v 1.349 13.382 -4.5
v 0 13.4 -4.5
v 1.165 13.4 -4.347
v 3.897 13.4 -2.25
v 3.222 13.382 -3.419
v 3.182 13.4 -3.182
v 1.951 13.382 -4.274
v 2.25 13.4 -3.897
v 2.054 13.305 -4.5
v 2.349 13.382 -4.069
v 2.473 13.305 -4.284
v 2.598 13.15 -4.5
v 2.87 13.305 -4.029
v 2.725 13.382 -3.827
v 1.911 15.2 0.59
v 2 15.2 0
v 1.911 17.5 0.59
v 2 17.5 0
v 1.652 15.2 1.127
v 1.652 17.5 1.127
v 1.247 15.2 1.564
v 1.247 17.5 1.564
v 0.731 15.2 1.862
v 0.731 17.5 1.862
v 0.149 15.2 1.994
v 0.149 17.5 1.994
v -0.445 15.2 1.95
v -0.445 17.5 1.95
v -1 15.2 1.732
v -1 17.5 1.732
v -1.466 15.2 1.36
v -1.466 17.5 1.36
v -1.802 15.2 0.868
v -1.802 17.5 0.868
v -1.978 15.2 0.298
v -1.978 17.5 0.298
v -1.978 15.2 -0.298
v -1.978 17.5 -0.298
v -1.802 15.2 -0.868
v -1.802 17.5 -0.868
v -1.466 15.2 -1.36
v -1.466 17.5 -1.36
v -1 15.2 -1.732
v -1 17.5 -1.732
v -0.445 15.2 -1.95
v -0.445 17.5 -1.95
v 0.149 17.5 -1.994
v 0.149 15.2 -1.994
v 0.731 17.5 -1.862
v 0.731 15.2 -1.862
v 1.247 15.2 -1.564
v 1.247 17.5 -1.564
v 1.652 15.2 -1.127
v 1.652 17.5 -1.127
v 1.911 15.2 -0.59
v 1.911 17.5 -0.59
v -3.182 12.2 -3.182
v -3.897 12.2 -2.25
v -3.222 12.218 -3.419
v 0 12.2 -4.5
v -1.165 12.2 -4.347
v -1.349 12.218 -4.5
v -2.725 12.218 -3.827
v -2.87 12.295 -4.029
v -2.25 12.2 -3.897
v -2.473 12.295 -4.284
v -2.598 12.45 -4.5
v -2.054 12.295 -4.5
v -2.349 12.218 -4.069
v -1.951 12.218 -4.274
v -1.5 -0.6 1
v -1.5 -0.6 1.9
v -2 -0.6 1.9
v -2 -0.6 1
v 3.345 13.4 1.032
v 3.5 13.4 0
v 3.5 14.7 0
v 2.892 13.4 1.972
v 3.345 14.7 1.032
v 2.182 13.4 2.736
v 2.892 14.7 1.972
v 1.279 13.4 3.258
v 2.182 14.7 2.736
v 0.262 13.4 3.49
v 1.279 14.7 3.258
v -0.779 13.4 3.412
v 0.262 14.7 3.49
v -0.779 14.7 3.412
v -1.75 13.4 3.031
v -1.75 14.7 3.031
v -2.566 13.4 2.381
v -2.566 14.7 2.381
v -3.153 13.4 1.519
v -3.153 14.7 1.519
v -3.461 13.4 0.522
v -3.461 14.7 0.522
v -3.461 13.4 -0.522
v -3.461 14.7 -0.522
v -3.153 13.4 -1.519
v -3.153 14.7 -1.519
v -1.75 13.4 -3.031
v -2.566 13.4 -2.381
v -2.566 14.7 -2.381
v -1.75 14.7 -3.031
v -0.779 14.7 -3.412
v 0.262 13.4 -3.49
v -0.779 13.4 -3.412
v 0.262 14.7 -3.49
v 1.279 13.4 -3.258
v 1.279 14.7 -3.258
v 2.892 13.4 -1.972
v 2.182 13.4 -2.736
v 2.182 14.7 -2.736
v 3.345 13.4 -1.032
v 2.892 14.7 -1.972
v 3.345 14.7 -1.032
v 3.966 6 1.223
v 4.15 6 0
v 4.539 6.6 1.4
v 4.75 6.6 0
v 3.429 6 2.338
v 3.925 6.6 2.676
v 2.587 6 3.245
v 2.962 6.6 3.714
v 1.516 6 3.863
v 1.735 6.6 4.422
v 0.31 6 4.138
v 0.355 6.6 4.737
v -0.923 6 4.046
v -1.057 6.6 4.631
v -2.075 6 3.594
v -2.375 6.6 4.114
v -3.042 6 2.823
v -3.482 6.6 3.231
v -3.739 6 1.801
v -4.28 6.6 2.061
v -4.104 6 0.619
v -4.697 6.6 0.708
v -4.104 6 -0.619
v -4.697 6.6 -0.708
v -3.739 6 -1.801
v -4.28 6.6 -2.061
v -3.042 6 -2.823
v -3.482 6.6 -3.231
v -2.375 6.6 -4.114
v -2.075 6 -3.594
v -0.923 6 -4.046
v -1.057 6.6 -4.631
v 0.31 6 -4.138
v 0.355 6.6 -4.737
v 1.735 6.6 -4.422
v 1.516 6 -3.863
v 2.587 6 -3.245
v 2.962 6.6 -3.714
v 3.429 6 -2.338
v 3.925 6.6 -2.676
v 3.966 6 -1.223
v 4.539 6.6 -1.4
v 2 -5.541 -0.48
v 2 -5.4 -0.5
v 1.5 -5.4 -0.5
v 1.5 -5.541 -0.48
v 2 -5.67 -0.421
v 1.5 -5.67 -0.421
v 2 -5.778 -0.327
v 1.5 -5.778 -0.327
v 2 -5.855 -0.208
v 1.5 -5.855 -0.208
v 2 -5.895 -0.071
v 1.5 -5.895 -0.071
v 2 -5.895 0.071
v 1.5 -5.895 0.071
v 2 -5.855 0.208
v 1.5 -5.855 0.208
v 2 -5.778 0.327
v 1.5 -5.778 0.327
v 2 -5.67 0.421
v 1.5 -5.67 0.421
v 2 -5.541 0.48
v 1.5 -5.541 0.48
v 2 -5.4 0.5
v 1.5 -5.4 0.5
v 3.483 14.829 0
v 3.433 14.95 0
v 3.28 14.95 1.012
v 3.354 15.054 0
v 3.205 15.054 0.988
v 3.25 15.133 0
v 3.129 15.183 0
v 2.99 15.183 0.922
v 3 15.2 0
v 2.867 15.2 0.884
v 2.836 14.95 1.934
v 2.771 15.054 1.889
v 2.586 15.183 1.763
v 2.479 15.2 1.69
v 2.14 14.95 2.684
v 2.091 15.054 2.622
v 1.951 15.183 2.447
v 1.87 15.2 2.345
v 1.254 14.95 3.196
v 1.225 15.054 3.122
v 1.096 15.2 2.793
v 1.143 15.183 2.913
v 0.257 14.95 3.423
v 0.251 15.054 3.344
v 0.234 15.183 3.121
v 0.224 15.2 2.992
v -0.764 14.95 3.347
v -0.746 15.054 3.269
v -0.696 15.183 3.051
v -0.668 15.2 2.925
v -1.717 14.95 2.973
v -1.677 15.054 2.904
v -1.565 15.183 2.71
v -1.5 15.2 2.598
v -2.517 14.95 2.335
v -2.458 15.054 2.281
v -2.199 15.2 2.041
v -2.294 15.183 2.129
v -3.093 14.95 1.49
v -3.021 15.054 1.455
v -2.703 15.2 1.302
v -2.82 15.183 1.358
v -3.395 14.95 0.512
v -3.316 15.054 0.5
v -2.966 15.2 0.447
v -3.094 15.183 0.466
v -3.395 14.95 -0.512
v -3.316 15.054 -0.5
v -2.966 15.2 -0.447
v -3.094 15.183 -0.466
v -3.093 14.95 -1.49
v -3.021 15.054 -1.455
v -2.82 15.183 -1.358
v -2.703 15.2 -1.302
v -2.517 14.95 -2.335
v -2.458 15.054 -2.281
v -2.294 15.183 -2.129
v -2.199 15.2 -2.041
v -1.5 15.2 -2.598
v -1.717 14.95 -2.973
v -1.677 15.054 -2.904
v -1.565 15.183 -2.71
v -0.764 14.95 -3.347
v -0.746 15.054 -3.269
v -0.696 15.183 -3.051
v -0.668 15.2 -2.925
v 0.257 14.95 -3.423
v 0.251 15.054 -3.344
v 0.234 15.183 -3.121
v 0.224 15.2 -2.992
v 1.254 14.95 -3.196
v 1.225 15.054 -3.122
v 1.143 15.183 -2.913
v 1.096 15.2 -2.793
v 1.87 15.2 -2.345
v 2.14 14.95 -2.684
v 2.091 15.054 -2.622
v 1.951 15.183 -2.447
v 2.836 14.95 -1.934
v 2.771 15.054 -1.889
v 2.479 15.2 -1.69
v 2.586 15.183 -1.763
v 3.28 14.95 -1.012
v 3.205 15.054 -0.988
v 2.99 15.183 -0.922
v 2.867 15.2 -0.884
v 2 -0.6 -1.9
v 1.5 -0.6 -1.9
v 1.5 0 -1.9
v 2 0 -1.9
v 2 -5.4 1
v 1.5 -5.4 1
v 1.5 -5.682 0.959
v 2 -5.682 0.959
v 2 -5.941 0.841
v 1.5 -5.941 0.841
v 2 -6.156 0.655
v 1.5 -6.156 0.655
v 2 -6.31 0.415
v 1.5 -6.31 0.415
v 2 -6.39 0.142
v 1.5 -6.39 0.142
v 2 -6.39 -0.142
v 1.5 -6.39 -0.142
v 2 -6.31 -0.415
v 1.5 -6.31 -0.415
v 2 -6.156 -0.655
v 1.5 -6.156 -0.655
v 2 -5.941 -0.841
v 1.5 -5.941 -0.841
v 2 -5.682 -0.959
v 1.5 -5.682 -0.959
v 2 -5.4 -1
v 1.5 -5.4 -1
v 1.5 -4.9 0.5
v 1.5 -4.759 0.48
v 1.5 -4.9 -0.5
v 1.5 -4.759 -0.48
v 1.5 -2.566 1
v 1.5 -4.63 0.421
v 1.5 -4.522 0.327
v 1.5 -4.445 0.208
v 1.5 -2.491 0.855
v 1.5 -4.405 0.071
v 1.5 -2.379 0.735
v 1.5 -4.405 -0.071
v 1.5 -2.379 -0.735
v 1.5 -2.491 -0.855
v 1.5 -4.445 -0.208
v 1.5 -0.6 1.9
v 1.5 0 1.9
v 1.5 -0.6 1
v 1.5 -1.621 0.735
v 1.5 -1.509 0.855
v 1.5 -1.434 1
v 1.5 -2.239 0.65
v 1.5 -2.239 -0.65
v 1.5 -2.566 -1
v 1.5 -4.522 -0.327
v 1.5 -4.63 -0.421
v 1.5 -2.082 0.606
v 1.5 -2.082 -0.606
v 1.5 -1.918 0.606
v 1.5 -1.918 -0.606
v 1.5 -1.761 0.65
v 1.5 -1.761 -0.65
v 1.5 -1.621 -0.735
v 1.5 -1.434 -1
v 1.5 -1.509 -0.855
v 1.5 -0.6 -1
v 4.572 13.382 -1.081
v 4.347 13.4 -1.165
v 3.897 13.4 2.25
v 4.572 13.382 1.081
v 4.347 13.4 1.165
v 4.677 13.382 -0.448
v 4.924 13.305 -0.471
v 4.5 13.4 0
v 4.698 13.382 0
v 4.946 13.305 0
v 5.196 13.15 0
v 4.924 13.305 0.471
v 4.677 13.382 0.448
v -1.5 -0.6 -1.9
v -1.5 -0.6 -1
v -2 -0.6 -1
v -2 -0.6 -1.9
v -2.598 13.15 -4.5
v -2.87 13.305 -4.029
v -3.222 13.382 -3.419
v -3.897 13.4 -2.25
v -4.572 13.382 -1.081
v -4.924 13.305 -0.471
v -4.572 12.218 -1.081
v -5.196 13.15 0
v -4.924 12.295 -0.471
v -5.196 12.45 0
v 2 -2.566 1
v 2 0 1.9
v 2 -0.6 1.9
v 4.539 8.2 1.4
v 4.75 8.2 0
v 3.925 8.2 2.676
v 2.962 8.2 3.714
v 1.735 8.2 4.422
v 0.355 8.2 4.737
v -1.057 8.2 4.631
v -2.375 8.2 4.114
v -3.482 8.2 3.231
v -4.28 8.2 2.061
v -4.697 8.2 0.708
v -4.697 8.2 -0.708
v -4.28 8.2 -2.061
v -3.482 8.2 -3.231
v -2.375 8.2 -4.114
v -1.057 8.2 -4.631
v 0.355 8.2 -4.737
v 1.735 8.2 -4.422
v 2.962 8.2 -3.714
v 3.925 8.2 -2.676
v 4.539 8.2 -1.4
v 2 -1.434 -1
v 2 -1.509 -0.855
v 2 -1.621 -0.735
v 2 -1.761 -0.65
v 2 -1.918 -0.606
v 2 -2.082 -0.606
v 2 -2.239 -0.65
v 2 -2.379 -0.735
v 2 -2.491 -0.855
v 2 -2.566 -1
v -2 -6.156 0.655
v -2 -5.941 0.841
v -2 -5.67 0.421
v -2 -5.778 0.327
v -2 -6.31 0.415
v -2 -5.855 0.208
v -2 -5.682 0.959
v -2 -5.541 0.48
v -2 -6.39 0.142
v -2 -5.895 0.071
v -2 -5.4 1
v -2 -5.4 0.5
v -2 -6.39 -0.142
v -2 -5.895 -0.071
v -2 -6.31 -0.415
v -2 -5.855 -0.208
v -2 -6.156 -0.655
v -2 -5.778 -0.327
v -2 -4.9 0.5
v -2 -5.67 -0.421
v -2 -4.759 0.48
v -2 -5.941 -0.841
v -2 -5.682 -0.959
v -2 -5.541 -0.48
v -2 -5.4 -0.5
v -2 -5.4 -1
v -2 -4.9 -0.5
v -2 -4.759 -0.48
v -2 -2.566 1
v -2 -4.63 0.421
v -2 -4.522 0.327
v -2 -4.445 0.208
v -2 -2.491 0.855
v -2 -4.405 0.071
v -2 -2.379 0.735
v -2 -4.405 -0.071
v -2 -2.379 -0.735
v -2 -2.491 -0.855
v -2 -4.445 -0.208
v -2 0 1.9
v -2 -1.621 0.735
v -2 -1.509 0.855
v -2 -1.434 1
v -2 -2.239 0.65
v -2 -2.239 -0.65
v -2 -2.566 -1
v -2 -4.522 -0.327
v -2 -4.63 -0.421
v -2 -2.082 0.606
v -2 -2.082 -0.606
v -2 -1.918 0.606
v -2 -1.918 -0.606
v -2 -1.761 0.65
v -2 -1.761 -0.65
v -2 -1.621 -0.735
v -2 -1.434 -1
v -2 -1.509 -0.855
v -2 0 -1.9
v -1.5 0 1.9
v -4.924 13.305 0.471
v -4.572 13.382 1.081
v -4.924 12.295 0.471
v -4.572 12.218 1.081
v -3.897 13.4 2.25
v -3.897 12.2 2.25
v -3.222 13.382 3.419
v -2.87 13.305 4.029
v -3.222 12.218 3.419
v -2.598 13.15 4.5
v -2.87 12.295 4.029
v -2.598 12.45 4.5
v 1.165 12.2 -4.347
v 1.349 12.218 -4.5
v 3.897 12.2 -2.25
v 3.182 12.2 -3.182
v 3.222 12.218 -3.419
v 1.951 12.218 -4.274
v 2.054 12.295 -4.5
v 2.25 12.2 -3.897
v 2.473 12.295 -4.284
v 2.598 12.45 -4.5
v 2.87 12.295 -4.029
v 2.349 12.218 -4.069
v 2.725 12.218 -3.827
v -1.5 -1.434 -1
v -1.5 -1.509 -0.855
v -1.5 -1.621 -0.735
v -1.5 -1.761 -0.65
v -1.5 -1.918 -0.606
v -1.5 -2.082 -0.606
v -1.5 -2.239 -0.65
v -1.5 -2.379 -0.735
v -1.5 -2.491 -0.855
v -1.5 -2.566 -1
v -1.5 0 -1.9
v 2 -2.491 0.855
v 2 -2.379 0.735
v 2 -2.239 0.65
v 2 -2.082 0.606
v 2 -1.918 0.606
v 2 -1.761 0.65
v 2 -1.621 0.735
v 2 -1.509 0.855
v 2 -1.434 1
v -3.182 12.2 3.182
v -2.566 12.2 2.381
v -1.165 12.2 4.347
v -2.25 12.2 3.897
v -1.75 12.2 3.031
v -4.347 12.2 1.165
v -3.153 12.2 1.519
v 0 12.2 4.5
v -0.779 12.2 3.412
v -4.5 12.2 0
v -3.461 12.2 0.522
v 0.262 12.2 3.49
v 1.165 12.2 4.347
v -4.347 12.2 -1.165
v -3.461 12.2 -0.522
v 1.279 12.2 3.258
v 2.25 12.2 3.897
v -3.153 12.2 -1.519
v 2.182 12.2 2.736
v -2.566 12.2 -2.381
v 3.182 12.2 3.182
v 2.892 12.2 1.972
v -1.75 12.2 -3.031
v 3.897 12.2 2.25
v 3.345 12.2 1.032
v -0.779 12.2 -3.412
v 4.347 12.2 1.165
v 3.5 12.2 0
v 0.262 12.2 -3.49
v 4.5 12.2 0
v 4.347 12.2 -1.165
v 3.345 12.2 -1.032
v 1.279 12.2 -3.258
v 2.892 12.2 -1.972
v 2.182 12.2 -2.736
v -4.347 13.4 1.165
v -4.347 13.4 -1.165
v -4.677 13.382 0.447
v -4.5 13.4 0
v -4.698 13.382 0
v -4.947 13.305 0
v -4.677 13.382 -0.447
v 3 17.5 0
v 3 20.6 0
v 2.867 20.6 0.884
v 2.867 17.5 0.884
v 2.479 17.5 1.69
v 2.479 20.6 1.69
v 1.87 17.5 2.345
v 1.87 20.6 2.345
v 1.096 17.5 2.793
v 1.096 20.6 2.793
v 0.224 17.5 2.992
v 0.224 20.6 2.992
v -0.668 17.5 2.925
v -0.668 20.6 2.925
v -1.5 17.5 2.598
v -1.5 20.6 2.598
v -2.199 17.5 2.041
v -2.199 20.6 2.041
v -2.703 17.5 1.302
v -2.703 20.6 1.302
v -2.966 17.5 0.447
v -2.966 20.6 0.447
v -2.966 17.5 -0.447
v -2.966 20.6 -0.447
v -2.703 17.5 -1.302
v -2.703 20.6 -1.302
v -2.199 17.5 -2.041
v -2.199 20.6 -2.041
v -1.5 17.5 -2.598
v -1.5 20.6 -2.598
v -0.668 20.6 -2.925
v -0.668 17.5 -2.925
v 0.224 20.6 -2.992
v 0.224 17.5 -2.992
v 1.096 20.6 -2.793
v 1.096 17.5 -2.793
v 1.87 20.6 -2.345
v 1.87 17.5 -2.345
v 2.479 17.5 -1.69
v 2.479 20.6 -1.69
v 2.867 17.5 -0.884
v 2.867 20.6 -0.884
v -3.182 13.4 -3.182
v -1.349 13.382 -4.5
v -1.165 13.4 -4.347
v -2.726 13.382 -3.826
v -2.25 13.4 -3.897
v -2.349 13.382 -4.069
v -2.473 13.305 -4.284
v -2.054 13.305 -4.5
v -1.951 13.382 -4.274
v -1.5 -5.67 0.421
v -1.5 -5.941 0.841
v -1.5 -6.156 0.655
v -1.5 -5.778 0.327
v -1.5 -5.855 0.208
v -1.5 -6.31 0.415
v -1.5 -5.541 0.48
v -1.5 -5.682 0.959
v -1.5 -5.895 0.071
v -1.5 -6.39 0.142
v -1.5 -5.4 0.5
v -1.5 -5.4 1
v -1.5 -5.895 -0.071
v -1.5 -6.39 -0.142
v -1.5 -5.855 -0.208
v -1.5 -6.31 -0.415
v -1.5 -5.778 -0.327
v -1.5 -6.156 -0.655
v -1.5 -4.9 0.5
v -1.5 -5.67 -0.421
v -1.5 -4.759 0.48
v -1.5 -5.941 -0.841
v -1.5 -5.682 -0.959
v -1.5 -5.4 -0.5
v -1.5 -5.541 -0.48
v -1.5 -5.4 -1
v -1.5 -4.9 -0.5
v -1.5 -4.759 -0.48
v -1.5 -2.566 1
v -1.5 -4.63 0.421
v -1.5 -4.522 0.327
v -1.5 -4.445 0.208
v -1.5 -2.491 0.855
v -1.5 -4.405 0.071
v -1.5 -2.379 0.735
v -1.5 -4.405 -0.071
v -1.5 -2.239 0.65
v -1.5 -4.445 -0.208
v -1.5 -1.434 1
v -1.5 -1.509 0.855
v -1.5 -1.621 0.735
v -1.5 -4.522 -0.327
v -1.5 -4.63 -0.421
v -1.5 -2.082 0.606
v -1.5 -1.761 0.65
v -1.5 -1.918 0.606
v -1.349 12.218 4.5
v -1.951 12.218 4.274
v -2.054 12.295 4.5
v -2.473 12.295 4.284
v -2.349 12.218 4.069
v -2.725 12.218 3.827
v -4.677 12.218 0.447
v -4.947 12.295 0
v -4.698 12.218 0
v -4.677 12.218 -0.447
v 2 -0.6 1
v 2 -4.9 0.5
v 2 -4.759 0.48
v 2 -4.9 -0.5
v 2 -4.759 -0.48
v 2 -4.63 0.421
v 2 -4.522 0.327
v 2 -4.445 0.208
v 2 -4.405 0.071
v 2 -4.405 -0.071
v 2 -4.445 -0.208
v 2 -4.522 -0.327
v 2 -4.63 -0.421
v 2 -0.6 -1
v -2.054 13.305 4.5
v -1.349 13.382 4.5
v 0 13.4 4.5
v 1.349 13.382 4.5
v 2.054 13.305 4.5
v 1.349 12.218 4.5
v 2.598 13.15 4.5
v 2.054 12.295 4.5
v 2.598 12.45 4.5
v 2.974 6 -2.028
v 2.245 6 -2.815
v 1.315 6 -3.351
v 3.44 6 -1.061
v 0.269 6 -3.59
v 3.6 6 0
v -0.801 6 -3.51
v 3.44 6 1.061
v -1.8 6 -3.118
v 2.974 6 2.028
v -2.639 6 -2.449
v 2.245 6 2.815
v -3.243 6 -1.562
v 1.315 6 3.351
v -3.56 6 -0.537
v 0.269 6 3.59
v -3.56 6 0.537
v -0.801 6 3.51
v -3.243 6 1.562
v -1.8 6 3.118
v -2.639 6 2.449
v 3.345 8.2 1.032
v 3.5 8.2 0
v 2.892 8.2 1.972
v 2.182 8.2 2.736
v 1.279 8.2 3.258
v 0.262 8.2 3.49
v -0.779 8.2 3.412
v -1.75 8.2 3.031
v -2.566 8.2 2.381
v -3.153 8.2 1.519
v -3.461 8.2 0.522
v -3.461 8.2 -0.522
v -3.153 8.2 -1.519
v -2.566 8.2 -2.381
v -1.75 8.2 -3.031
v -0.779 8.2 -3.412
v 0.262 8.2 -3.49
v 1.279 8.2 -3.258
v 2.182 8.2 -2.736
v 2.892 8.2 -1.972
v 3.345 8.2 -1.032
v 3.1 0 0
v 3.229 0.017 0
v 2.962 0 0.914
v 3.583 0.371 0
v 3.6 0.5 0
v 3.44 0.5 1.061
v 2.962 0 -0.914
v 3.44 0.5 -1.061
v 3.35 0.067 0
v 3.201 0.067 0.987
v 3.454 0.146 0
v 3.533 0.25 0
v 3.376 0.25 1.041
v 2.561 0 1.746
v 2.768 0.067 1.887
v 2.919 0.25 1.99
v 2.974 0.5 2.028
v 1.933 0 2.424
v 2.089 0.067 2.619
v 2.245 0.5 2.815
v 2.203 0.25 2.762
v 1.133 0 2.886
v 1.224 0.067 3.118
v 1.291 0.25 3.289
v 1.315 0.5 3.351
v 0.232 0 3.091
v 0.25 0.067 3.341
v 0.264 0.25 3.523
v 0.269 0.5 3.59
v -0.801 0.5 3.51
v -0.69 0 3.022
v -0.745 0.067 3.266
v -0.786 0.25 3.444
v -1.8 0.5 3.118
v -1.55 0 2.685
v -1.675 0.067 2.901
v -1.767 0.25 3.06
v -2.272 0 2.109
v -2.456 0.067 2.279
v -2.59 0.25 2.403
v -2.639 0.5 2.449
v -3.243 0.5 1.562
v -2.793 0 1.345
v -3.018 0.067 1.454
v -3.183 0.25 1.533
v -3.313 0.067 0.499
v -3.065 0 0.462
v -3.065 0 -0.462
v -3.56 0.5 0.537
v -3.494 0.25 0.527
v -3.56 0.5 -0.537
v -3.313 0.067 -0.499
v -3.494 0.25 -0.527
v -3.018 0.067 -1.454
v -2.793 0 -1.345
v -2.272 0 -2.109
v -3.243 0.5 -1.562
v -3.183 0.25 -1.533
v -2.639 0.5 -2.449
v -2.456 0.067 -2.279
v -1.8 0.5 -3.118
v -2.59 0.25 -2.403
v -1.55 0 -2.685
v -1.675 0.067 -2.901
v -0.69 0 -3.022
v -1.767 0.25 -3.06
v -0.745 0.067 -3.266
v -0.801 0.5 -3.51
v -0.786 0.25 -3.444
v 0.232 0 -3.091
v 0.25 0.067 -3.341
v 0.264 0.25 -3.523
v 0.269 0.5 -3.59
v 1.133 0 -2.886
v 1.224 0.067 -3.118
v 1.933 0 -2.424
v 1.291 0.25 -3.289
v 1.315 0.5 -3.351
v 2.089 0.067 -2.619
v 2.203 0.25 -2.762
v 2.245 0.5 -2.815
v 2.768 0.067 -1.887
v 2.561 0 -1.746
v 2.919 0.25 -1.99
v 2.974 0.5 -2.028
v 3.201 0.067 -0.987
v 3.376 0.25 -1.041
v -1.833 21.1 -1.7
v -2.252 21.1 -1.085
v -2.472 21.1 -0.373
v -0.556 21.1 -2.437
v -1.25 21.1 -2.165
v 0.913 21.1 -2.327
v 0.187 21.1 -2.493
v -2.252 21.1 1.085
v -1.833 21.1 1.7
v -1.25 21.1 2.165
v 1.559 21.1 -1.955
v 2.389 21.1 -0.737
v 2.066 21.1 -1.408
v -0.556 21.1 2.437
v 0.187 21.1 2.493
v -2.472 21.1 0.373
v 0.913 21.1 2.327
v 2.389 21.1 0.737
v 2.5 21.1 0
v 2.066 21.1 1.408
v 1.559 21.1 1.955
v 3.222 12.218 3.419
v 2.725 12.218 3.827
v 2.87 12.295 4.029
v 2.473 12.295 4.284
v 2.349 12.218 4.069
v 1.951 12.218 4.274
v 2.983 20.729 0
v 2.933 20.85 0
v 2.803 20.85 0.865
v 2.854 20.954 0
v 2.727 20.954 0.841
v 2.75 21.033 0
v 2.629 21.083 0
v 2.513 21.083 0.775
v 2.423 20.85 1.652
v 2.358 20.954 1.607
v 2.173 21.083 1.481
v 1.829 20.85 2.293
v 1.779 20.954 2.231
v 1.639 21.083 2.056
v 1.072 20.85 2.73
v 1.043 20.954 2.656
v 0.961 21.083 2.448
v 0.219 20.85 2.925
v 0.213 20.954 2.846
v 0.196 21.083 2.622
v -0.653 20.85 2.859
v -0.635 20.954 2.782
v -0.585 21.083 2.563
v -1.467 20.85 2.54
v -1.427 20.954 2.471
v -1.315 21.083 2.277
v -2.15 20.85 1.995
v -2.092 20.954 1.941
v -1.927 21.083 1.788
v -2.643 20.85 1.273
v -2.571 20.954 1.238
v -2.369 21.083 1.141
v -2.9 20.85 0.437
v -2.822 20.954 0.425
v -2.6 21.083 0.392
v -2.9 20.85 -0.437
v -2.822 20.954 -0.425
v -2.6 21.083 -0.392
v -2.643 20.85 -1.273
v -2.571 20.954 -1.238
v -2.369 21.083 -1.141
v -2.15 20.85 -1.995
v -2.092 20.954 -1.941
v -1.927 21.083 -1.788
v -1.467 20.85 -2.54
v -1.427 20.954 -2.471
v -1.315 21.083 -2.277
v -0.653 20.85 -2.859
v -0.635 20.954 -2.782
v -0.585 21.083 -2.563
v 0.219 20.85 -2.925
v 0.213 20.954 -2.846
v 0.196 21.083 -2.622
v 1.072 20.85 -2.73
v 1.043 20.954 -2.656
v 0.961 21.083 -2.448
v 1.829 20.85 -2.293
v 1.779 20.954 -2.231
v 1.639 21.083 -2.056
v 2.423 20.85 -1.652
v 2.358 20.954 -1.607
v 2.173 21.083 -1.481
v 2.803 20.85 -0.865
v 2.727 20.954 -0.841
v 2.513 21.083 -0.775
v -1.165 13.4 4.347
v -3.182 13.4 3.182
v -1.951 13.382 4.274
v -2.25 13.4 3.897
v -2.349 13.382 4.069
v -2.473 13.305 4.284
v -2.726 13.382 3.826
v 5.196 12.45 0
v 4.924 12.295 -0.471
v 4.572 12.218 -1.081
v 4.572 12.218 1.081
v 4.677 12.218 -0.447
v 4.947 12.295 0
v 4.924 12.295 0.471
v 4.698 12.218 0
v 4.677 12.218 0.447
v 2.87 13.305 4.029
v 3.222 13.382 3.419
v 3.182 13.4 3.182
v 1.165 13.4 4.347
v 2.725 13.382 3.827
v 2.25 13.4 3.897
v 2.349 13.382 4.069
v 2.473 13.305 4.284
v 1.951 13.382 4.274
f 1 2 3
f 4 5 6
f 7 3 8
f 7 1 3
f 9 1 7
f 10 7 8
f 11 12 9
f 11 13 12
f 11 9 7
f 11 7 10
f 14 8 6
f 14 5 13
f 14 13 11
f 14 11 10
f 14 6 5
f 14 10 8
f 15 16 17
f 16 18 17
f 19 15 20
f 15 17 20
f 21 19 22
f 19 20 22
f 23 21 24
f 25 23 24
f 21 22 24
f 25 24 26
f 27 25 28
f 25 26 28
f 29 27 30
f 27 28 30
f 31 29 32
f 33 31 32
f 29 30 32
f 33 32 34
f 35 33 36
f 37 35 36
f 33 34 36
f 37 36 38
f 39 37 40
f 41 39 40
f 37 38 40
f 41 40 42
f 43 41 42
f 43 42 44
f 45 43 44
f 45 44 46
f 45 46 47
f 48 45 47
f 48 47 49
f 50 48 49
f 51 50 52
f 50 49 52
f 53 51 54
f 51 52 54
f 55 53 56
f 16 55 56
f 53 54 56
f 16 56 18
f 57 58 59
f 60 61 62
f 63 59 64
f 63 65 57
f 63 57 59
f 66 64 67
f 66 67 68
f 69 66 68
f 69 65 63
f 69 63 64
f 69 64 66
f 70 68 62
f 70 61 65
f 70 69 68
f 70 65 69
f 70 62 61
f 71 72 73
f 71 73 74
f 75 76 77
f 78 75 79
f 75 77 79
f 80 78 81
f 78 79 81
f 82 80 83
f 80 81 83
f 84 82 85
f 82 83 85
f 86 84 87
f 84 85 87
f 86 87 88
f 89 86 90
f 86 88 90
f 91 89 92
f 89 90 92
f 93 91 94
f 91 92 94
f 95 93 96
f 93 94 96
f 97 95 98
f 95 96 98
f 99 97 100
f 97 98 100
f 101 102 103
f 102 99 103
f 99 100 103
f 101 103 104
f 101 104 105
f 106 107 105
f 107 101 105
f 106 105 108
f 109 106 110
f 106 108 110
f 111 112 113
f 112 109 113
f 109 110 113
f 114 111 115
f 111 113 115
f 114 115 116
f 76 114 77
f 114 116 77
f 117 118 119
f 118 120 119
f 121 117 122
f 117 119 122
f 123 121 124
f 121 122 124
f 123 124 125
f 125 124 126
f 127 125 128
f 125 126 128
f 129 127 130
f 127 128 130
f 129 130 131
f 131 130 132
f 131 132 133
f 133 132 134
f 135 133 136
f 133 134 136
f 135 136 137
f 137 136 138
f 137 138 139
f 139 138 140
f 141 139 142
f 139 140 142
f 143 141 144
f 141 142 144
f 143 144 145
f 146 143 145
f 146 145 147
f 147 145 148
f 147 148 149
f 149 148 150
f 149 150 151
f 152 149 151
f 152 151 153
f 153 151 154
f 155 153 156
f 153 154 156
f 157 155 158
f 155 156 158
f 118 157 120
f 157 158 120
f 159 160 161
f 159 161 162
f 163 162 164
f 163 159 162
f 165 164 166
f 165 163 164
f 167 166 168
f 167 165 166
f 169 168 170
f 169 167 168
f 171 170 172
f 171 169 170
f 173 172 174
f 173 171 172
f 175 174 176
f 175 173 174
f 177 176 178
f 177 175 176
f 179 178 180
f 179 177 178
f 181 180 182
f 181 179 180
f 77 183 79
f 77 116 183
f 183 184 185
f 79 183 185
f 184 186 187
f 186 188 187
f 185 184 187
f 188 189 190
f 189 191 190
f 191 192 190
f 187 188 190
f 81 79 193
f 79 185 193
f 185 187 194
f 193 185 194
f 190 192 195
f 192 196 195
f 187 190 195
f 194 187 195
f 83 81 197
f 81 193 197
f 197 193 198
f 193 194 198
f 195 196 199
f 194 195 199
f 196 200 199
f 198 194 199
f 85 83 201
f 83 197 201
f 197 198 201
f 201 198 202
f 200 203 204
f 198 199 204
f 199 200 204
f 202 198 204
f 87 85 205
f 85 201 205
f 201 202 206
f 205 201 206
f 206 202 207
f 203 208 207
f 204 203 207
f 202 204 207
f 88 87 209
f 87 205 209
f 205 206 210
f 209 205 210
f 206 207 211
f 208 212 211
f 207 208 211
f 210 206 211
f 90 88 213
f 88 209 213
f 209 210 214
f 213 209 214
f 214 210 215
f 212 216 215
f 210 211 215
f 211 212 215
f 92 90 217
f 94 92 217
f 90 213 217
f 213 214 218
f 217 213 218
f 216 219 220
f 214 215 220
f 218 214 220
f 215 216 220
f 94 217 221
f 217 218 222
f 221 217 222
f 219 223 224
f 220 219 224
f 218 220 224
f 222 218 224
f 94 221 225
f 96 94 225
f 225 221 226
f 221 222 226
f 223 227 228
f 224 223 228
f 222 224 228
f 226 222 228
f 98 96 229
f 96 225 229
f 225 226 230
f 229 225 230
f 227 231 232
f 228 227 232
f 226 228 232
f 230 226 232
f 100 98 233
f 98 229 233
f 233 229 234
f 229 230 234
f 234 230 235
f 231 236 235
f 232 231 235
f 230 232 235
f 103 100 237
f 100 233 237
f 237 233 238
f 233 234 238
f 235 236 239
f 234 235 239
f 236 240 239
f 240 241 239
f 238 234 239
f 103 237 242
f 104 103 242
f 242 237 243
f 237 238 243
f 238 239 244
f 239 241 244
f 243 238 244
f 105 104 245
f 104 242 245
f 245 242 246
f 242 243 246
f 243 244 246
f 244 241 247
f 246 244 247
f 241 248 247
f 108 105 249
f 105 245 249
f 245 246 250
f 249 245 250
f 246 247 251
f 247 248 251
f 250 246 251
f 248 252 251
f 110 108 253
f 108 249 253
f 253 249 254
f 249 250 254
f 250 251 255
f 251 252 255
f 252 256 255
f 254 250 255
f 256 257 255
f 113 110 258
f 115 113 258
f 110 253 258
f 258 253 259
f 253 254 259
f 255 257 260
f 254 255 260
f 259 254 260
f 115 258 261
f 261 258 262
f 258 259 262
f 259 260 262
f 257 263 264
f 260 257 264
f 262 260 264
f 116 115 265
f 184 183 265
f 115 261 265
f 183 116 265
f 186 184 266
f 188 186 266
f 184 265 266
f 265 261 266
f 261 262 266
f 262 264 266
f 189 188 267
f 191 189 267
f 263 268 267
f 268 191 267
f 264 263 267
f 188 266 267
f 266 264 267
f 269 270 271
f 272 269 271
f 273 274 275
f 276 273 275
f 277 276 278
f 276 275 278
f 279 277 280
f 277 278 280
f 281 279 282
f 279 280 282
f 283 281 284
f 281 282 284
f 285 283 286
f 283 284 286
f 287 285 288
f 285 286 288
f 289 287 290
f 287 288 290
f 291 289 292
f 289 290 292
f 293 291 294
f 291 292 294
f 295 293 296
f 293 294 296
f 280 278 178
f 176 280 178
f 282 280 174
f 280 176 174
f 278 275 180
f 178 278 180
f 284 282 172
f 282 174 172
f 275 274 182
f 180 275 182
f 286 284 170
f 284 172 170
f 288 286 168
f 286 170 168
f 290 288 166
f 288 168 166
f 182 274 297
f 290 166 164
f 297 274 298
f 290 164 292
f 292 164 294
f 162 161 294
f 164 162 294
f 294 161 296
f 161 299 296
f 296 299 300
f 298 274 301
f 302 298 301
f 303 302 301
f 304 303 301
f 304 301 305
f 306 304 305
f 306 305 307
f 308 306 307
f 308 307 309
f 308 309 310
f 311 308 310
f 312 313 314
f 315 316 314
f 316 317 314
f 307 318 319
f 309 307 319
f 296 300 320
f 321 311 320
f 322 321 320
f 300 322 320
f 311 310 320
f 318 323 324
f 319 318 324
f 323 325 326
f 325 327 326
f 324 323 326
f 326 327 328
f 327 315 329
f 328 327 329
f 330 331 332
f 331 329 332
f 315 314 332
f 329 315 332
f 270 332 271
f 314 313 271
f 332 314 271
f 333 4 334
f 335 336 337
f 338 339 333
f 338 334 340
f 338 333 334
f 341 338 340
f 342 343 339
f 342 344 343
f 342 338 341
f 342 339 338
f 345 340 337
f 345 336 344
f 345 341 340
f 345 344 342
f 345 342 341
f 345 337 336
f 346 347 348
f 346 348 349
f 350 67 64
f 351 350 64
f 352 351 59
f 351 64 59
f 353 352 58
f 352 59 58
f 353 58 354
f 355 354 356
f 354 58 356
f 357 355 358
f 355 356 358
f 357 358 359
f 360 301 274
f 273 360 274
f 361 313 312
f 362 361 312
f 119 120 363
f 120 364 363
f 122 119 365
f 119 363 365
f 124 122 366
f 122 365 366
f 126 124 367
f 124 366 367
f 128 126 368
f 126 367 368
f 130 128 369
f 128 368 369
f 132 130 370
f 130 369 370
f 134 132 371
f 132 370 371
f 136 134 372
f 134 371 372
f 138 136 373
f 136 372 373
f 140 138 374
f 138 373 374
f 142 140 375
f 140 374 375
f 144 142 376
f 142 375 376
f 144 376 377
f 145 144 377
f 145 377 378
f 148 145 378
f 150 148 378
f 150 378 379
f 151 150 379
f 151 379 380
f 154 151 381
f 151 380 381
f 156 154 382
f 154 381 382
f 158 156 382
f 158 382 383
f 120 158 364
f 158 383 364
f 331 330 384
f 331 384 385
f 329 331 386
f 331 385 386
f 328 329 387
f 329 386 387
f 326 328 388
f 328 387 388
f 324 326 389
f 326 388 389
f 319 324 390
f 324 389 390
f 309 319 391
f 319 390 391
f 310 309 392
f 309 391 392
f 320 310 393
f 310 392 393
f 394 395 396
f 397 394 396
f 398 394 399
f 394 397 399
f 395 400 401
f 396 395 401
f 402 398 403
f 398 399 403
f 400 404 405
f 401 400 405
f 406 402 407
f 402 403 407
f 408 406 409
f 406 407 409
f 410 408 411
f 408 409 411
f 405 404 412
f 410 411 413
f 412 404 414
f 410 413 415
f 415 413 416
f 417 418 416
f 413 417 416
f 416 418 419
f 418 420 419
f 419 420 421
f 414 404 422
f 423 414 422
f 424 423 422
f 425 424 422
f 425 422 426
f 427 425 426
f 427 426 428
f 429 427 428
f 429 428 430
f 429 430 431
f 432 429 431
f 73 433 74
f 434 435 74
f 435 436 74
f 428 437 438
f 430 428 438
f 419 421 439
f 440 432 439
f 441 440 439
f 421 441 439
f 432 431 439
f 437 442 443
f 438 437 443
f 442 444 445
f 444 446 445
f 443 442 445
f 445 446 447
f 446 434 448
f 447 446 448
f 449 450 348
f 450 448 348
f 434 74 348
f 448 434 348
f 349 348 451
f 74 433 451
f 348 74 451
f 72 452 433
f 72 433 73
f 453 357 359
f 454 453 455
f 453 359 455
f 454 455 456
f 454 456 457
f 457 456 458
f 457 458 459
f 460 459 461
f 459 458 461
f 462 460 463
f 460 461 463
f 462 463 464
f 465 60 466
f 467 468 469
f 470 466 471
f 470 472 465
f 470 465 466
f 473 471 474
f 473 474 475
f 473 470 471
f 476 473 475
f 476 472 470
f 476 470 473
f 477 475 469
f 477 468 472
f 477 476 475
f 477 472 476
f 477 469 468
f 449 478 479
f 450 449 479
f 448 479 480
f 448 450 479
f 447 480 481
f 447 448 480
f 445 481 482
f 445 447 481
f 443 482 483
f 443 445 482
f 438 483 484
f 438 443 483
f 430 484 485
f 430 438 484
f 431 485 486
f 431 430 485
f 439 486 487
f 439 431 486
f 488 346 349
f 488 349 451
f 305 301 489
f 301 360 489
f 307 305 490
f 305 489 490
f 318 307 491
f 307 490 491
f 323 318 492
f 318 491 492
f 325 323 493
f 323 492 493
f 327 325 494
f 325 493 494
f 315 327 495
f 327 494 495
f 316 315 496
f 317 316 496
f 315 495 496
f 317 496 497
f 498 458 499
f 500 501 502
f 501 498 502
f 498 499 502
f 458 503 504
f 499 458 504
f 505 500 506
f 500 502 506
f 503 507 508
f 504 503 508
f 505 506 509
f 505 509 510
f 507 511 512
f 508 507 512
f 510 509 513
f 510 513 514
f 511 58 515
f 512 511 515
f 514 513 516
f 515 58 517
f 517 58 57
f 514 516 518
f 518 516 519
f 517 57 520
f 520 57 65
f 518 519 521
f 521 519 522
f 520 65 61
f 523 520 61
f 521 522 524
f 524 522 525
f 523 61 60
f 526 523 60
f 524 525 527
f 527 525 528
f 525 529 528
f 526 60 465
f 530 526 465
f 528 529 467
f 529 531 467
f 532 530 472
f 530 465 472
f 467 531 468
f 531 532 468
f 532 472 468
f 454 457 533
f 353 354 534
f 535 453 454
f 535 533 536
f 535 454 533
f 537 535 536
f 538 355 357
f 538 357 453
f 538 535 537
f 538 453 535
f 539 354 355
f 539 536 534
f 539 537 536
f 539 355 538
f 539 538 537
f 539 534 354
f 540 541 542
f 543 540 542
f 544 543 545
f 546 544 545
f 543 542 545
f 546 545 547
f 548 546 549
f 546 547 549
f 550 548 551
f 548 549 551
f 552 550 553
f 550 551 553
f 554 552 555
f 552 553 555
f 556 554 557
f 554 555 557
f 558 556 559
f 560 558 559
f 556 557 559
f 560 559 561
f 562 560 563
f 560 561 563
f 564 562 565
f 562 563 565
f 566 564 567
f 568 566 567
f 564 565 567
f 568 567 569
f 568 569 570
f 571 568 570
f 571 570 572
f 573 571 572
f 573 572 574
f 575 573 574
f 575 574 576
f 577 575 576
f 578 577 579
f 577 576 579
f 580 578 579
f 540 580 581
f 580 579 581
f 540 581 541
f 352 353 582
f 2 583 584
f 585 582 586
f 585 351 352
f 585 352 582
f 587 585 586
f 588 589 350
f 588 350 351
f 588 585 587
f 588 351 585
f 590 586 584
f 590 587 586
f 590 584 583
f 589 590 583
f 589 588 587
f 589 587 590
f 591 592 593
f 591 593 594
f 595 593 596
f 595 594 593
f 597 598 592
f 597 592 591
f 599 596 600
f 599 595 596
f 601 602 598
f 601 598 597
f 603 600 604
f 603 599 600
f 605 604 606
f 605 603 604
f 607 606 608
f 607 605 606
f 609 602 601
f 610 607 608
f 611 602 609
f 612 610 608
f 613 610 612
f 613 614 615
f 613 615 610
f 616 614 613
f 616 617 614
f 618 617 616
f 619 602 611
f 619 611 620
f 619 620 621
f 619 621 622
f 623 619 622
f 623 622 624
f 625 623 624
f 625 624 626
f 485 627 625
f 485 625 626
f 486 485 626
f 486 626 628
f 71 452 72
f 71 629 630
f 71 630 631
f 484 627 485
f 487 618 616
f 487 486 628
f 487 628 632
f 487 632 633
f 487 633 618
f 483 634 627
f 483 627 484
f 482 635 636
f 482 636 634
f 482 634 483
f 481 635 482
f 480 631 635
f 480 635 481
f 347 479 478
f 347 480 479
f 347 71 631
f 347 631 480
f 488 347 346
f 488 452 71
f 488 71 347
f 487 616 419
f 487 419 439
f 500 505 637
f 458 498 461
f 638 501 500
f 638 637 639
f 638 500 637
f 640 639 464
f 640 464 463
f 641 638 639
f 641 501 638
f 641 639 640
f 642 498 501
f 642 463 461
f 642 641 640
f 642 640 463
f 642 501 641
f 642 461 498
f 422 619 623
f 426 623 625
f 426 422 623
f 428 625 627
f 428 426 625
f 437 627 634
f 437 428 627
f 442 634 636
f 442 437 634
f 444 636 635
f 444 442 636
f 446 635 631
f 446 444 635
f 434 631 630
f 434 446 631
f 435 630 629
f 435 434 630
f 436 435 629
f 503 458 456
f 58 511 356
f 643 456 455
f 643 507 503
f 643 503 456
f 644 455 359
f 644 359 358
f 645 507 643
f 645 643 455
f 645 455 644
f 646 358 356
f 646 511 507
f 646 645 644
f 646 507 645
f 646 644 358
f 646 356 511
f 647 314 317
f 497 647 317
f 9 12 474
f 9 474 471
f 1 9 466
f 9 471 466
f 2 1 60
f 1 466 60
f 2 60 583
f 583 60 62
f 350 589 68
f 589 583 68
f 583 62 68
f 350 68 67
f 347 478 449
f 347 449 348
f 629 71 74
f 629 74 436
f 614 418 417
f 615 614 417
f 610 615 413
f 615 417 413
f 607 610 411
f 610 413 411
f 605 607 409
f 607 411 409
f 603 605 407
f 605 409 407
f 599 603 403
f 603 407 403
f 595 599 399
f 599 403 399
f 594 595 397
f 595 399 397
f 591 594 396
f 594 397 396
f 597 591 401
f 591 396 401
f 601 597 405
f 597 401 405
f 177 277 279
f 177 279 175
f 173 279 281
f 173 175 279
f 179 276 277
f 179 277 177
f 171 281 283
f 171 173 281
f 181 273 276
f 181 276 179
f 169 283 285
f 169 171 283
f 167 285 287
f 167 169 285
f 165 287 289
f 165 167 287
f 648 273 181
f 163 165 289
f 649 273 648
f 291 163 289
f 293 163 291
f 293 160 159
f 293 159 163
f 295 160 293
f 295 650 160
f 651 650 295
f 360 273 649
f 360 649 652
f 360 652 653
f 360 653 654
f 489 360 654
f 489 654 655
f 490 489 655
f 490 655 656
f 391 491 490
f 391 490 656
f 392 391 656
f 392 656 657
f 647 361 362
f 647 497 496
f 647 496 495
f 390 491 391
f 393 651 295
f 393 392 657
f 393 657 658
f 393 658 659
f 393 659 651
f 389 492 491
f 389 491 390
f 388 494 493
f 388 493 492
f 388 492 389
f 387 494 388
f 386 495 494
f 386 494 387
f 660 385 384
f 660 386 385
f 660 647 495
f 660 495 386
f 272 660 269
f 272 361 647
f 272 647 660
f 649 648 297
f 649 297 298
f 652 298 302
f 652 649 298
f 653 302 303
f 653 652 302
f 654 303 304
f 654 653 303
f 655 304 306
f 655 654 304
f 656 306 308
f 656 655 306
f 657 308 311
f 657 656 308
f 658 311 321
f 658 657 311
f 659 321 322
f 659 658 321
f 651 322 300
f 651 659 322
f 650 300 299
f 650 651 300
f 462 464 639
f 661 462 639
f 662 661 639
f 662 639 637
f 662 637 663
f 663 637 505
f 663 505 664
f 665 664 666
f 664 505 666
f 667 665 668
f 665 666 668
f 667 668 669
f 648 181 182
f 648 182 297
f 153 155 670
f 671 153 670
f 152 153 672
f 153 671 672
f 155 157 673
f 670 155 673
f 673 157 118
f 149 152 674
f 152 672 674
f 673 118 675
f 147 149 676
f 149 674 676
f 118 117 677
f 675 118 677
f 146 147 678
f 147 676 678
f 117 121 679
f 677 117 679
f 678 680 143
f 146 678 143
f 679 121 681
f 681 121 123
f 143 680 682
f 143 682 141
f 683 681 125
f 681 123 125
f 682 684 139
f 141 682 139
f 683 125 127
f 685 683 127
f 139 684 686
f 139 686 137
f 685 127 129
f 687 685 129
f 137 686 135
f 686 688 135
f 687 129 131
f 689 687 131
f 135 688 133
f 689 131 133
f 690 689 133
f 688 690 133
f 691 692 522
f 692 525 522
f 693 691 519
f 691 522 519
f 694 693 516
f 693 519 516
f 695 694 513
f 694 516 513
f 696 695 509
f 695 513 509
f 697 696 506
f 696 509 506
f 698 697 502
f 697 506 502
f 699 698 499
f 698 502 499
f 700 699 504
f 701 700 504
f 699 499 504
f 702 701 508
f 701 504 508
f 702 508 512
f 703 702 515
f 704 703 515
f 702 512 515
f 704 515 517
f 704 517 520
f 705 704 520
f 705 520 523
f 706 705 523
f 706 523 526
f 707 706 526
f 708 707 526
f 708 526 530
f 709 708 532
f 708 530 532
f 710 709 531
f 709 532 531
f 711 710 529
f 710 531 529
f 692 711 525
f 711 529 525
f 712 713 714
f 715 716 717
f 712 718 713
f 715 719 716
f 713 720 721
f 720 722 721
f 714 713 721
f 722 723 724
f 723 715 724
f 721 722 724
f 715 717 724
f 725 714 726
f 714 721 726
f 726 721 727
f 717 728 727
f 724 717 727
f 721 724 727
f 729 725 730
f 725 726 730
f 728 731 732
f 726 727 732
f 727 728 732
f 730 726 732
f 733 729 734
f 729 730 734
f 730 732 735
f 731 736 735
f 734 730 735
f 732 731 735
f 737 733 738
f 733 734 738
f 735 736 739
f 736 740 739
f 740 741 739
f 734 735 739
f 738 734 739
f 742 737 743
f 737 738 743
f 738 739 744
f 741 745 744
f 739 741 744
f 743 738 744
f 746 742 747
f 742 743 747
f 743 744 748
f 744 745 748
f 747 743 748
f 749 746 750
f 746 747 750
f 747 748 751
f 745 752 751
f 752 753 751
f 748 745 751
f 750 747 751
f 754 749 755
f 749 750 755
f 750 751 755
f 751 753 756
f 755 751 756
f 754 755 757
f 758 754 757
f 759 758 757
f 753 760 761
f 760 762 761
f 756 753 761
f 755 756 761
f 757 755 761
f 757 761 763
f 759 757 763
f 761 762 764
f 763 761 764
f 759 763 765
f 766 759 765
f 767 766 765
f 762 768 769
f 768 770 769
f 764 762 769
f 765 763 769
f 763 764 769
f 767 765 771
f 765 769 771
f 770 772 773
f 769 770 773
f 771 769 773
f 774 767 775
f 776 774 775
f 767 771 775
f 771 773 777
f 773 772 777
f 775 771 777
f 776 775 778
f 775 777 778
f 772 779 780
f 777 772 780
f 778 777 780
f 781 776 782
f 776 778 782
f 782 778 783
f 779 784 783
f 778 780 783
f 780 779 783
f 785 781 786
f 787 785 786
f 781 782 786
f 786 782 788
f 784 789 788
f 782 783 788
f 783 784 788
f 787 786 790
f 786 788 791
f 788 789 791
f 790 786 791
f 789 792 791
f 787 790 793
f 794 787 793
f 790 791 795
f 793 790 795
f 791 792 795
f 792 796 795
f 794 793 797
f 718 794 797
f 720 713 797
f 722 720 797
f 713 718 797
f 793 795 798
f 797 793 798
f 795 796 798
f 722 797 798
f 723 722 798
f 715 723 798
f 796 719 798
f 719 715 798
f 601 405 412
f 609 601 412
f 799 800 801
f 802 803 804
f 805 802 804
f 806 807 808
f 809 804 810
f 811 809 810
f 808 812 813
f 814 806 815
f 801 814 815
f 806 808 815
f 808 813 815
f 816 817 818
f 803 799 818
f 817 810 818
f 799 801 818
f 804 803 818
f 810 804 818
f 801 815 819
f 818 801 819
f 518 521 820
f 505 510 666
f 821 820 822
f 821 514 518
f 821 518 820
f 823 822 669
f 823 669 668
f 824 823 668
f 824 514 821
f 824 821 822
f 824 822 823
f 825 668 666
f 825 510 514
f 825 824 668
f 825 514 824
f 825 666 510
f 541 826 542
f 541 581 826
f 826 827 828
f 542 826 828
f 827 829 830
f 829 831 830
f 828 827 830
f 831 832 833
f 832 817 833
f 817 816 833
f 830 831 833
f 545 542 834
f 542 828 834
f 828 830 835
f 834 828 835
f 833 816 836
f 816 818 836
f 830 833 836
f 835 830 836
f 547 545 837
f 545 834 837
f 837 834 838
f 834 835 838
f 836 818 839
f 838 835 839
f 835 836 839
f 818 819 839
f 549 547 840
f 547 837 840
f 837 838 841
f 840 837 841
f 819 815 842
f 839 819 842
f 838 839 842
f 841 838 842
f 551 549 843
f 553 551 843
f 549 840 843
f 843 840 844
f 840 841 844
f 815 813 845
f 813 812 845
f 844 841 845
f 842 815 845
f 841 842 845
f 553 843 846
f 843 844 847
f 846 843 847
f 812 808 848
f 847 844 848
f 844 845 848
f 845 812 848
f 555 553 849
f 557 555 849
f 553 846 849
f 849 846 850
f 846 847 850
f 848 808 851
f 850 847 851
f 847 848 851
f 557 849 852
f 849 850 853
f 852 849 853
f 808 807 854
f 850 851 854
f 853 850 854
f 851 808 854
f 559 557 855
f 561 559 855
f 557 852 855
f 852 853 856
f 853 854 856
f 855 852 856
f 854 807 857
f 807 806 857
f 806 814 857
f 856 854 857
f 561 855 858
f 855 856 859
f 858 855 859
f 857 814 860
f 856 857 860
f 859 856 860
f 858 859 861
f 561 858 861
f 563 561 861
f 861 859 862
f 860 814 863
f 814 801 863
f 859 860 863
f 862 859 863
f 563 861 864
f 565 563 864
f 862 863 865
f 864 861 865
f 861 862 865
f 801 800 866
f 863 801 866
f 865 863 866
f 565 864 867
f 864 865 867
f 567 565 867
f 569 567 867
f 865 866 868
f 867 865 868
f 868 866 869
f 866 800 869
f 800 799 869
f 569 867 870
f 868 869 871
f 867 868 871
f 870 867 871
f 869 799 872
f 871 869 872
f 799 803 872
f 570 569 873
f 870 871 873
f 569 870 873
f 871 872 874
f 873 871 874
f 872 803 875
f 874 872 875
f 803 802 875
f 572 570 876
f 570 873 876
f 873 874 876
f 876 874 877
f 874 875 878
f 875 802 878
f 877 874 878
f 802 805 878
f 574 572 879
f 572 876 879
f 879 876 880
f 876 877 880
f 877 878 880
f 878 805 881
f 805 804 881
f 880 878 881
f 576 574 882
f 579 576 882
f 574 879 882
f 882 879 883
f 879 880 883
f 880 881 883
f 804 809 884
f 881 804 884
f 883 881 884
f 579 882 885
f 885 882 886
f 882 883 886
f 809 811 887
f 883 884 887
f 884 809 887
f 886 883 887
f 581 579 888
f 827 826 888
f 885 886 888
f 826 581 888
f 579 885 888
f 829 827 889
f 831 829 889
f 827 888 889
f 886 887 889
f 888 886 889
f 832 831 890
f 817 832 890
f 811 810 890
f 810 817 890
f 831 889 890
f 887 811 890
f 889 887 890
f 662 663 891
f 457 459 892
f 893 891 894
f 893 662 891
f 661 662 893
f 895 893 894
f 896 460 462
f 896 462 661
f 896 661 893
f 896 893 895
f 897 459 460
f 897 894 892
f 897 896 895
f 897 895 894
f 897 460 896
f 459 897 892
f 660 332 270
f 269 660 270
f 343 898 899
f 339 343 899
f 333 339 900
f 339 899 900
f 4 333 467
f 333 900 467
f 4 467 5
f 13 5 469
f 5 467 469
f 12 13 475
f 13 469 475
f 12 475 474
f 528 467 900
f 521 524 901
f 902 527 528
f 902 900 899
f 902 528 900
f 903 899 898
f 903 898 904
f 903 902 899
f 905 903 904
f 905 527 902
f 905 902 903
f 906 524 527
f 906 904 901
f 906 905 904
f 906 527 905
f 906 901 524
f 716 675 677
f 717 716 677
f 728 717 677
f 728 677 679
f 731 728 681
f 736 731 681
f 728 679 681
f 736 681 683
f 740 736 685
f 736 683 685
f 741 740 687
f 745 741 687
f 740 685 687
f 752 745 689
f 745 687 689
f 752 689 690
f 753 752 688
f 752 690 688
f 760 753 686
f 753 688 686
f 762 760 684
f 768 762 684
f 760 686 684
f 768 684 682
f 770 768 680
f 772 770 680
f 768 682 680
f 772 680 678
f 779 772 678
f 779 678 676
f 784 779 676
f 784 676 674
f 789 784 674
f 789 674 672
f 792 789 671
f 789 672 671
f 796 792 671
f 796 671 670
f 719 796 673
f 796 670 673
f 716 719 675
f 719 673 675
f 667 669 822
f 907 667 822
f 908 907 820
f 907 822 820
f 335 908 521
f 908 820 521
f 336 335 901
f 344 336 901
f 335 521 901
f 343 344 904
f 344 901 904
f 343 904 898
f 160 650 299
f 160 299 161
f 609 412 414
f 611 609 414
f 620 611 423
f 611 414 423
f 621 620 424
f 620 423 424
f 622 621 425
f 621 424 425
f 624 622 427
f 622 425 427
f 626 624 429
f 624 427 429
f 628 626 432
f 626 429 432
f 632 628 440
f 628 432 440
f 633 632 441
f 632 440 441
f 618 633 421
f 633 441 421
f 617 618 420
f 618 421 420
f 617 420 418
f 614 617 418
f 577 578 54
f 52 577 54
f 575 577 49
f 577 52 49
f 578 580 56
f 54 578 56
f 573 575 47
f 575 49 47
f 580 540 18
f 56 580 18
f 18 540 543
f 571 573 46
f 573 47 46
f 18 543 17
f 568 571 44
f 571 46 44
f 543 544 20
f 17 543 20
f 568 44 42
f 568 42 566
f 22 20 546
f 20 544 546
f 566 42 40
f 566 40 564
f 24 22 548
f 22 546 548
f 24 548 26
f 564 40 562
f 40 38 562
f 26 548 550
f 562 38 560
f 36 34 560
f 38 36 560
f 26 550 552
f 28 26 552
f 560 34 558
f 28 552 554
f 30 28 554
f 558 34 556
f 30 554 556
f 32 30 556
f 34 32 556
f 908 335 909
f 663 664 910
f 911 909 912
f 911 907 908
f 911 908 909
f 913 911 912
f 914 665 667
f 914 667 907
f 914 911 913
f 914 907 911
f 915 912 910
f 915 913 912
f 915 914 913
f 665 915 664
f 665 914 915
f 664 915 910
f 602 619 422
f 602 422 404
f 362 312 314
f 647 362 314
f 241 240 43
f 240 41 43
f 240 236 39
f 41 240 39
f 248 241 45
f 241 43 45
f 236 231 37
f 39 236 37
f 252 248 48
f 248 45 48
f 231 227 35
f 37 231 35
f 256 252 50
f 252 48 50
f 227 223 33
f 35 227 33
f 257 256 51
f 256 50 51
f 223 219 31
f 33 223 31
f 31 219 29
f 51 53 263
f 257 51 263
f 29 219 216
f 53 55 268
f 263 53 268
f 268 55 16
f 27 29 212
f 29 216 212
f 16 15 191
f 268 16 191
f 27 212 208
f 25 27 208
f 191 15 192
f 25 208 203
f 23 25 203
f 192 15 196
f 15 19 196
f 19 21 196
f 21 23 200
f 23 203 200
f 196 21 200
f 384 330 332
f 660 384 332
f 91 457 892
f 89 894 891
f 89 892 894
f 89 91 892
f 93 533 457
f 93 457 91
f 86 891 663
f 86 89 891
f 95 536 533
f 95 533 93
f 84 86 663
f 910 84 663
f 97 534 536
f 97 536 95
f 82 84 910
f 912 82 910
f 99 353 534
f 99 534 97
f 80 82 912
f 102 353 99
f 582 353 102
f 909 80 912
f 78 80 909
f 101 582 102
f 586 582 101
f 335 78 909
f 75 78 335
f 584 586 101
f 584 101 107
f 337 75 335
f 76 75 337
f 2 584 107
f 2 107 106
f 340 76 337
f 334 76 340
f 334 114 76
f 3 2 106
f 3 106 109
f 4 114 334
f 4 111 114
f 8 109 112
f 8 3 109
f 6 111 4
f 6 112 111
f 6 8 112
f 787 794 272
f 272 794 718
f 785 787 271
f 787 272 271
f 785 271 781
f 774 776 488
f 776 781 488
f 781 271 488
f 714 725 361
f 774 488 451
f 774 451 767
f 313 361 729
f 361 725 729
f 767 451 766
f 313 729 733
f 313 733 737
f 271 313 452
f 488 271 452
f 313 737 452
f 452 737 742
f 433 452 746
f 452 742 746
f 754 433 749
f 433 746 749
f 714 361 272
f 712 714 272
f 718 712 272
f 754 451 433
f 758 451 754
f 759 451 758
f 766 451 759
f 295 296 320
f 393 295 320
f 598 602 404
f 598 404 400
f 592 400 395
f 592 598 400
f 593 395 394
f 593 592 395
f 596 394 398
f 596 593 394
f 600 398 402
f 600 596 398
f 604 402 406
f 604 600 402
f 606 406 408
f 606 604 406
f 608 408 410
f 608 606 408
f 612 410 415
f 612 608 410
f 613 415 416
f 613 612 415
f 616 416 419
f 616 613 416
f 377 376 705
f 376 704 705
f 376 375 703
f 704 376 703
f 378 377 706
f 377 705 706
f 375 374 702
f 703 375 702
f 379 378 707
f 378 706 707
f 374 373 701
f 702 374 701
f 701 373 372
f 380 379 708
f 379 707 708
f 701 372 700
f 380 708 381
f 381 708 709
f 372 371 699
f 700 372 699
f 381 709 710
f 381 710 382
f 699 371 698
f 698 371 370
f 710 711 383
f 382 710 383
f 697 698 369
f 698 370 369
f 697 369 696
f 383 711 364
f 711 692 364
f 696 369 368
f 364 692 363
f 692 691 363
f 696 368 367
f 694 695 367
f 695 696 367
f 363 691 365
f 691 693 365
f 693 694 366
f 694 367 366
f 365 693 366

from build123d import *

# Parameters (mm, degrees)
FILLET1_R           = 0.5
BOSS_EXTRUDE1_START = 1.5
BOSS_EXTRUDE1_DEPTH = 0.5
SKETCH3_R           = 0.6
CUT_EXTRUDE1_DEPTH  = 0.5
BOSS_EXTRUDE2_START = 4
SKETCH4_R           = 3.5
BOSS_EXTRUDE2_DEPTH = 1.2


with BuildPart() as part:
    # Sketch1 → Revolve1 (revolve)
    with BuildSketch(Plane.XY):
        Polygon((0, 0), (3.6, 0), (3.6, 6), (4.15, 6), (4.75, 6.6), (4.75, 8.2), (3.5, 8.2), (3.5, 15.2), (2, 15.2), (2, 17.5), (3, 17.5), (3, 21.1), (0, 21.1), align=None)
    revolve(axis=Axis((0, 21.1, 0), (0, -1, 0)))

    # Fillet1
    fillet1_edges = [part.edges().sort_by_distance(p)[0] for p in [
        (-3.5, 15.2, 0),
        (-3.6, 0, 0),
        (-3, 21.1, 0),
    ]]
    fillet(fillet1_edges, radius=FILLET1_R)

    # Sketch2 → Boss-Extrude1 (add)
    with BuildSketch(Plane(origin=(0, 0, 0), x_dir=(0, 0, -1), z_dir=(1, 0, 0)).offset(BOSS_EXTRUDE1_START)):
        with BuildLine():
            Line((-1.9, 0), (-1.9, -0.6))
            Line((-1.9, -0.6), (-1, -0.6))
            Line((-1, -0.6), (-1, -5.4))
            ThreePointArc((-1, -5.4), (0, -6.4), (1, -5.4))
            Line((1, -5.4), (1, -0.6))
            Line((1, -0.6), (1.9, -0.6))
            Line((1.9, -0.6), (1.9, 0))
            Line((1.9, 0), (-1.9, 0))
        make_face()
    boss_extrude1 = extrude(amount=BOSS_EXTRUDE1_DEPTH)

    # Sketch3 → Cut-Extrude1 (cut)
    with BuildSketch(Plane(origin=(2, 0, 0), x_dir=(0, 0, -1), z_dir=(1, 0, 0))):
        with Locations((-1.2, -2)):
            Circle(SKETCH3_R)
        with Locations((1.2, -2)):
            Circle(SKETCH3_R)
        with BuildLine():
            Line((-0.5, -5.4), (-0.5, -4.9))
            ThreePointArc((-0.5, -4.9), (0, -4.4), (0.5, -4.9))
            Line((0.5, -4.9), (0.5, -5.4))
            ThreePointArc((0.5, -5.4), (0, -5.9), (-0.5, -5.4))
        make_face()
    cut_extrude1 = extrude(amount=-CUT_EXTRUDE1_DEPTH, mode=Mode.SUBTRACT)

    # Mirror1: Boss-Extrude1, Cut-Extrude1 across plane
    add(boss_extrude1.mirror(Plane(origin=(0, 0, 0), x_dir=(0, 0, 1), z_dir=(1, 0, 0))))
    add(cut_extrude1.mirror(Plane(origin=(0, 0, 0), x_dir=(0, 0, 1), z_dir=(1, 0, 0))), mode=Mode.SUBTRACT)

    # Sketch4 → Boss-Extrude2 (add)
    with BuildSketch(Plane(origin=(0, 8.2, 0), x_dir=(1, 0, 0), z_dir=(0, 1, 0)).offset(BOSS_EXTRUDE2_START)):
        Polygon((5.196152423, 0), (2.598076211, 4.5), (-2.598076211, 4.5), (-5.196152423, 0), (-2.598076211, -4.5), (2.598076211, -4.5), align=None)
        Circle(SKETCH4_R, mode=Mode.SUBTRACT)
    extrude(amount=BOSS_EXTRUDE2_DEPTH)

    # Sketch5 → Cut-Revolve1 (revolve, cut)
    with BuildSketch(Plane.XY):
        with BuildLine():
            Line((-5.196152423, 13.4), (-4.5, 13.4))
            ThreePointArc((-4.5, 13.4), (-4.869840572, 13.33560525), (-5.196152423, 13.15))
            Line((-5.196152423, 13.15), (-5.196152423, 13.4))
        make_face()
        with BuildLine():
            Line((-4.5, 12.2), (-5.196152423, 12.2))
            Line((-5.196152423, 12.2), (-5.196152423, 12.45))
            ThreePointArc((-5.196152423, 12.45), (-4.869840572, 12.26439475), (-4.5, 12.2))
        make_face()
    revolve(axis=Axis((0, 13.4, 0), (0, -1, 0)), mode=Mode.SUBTRACT)


solid = part.part
